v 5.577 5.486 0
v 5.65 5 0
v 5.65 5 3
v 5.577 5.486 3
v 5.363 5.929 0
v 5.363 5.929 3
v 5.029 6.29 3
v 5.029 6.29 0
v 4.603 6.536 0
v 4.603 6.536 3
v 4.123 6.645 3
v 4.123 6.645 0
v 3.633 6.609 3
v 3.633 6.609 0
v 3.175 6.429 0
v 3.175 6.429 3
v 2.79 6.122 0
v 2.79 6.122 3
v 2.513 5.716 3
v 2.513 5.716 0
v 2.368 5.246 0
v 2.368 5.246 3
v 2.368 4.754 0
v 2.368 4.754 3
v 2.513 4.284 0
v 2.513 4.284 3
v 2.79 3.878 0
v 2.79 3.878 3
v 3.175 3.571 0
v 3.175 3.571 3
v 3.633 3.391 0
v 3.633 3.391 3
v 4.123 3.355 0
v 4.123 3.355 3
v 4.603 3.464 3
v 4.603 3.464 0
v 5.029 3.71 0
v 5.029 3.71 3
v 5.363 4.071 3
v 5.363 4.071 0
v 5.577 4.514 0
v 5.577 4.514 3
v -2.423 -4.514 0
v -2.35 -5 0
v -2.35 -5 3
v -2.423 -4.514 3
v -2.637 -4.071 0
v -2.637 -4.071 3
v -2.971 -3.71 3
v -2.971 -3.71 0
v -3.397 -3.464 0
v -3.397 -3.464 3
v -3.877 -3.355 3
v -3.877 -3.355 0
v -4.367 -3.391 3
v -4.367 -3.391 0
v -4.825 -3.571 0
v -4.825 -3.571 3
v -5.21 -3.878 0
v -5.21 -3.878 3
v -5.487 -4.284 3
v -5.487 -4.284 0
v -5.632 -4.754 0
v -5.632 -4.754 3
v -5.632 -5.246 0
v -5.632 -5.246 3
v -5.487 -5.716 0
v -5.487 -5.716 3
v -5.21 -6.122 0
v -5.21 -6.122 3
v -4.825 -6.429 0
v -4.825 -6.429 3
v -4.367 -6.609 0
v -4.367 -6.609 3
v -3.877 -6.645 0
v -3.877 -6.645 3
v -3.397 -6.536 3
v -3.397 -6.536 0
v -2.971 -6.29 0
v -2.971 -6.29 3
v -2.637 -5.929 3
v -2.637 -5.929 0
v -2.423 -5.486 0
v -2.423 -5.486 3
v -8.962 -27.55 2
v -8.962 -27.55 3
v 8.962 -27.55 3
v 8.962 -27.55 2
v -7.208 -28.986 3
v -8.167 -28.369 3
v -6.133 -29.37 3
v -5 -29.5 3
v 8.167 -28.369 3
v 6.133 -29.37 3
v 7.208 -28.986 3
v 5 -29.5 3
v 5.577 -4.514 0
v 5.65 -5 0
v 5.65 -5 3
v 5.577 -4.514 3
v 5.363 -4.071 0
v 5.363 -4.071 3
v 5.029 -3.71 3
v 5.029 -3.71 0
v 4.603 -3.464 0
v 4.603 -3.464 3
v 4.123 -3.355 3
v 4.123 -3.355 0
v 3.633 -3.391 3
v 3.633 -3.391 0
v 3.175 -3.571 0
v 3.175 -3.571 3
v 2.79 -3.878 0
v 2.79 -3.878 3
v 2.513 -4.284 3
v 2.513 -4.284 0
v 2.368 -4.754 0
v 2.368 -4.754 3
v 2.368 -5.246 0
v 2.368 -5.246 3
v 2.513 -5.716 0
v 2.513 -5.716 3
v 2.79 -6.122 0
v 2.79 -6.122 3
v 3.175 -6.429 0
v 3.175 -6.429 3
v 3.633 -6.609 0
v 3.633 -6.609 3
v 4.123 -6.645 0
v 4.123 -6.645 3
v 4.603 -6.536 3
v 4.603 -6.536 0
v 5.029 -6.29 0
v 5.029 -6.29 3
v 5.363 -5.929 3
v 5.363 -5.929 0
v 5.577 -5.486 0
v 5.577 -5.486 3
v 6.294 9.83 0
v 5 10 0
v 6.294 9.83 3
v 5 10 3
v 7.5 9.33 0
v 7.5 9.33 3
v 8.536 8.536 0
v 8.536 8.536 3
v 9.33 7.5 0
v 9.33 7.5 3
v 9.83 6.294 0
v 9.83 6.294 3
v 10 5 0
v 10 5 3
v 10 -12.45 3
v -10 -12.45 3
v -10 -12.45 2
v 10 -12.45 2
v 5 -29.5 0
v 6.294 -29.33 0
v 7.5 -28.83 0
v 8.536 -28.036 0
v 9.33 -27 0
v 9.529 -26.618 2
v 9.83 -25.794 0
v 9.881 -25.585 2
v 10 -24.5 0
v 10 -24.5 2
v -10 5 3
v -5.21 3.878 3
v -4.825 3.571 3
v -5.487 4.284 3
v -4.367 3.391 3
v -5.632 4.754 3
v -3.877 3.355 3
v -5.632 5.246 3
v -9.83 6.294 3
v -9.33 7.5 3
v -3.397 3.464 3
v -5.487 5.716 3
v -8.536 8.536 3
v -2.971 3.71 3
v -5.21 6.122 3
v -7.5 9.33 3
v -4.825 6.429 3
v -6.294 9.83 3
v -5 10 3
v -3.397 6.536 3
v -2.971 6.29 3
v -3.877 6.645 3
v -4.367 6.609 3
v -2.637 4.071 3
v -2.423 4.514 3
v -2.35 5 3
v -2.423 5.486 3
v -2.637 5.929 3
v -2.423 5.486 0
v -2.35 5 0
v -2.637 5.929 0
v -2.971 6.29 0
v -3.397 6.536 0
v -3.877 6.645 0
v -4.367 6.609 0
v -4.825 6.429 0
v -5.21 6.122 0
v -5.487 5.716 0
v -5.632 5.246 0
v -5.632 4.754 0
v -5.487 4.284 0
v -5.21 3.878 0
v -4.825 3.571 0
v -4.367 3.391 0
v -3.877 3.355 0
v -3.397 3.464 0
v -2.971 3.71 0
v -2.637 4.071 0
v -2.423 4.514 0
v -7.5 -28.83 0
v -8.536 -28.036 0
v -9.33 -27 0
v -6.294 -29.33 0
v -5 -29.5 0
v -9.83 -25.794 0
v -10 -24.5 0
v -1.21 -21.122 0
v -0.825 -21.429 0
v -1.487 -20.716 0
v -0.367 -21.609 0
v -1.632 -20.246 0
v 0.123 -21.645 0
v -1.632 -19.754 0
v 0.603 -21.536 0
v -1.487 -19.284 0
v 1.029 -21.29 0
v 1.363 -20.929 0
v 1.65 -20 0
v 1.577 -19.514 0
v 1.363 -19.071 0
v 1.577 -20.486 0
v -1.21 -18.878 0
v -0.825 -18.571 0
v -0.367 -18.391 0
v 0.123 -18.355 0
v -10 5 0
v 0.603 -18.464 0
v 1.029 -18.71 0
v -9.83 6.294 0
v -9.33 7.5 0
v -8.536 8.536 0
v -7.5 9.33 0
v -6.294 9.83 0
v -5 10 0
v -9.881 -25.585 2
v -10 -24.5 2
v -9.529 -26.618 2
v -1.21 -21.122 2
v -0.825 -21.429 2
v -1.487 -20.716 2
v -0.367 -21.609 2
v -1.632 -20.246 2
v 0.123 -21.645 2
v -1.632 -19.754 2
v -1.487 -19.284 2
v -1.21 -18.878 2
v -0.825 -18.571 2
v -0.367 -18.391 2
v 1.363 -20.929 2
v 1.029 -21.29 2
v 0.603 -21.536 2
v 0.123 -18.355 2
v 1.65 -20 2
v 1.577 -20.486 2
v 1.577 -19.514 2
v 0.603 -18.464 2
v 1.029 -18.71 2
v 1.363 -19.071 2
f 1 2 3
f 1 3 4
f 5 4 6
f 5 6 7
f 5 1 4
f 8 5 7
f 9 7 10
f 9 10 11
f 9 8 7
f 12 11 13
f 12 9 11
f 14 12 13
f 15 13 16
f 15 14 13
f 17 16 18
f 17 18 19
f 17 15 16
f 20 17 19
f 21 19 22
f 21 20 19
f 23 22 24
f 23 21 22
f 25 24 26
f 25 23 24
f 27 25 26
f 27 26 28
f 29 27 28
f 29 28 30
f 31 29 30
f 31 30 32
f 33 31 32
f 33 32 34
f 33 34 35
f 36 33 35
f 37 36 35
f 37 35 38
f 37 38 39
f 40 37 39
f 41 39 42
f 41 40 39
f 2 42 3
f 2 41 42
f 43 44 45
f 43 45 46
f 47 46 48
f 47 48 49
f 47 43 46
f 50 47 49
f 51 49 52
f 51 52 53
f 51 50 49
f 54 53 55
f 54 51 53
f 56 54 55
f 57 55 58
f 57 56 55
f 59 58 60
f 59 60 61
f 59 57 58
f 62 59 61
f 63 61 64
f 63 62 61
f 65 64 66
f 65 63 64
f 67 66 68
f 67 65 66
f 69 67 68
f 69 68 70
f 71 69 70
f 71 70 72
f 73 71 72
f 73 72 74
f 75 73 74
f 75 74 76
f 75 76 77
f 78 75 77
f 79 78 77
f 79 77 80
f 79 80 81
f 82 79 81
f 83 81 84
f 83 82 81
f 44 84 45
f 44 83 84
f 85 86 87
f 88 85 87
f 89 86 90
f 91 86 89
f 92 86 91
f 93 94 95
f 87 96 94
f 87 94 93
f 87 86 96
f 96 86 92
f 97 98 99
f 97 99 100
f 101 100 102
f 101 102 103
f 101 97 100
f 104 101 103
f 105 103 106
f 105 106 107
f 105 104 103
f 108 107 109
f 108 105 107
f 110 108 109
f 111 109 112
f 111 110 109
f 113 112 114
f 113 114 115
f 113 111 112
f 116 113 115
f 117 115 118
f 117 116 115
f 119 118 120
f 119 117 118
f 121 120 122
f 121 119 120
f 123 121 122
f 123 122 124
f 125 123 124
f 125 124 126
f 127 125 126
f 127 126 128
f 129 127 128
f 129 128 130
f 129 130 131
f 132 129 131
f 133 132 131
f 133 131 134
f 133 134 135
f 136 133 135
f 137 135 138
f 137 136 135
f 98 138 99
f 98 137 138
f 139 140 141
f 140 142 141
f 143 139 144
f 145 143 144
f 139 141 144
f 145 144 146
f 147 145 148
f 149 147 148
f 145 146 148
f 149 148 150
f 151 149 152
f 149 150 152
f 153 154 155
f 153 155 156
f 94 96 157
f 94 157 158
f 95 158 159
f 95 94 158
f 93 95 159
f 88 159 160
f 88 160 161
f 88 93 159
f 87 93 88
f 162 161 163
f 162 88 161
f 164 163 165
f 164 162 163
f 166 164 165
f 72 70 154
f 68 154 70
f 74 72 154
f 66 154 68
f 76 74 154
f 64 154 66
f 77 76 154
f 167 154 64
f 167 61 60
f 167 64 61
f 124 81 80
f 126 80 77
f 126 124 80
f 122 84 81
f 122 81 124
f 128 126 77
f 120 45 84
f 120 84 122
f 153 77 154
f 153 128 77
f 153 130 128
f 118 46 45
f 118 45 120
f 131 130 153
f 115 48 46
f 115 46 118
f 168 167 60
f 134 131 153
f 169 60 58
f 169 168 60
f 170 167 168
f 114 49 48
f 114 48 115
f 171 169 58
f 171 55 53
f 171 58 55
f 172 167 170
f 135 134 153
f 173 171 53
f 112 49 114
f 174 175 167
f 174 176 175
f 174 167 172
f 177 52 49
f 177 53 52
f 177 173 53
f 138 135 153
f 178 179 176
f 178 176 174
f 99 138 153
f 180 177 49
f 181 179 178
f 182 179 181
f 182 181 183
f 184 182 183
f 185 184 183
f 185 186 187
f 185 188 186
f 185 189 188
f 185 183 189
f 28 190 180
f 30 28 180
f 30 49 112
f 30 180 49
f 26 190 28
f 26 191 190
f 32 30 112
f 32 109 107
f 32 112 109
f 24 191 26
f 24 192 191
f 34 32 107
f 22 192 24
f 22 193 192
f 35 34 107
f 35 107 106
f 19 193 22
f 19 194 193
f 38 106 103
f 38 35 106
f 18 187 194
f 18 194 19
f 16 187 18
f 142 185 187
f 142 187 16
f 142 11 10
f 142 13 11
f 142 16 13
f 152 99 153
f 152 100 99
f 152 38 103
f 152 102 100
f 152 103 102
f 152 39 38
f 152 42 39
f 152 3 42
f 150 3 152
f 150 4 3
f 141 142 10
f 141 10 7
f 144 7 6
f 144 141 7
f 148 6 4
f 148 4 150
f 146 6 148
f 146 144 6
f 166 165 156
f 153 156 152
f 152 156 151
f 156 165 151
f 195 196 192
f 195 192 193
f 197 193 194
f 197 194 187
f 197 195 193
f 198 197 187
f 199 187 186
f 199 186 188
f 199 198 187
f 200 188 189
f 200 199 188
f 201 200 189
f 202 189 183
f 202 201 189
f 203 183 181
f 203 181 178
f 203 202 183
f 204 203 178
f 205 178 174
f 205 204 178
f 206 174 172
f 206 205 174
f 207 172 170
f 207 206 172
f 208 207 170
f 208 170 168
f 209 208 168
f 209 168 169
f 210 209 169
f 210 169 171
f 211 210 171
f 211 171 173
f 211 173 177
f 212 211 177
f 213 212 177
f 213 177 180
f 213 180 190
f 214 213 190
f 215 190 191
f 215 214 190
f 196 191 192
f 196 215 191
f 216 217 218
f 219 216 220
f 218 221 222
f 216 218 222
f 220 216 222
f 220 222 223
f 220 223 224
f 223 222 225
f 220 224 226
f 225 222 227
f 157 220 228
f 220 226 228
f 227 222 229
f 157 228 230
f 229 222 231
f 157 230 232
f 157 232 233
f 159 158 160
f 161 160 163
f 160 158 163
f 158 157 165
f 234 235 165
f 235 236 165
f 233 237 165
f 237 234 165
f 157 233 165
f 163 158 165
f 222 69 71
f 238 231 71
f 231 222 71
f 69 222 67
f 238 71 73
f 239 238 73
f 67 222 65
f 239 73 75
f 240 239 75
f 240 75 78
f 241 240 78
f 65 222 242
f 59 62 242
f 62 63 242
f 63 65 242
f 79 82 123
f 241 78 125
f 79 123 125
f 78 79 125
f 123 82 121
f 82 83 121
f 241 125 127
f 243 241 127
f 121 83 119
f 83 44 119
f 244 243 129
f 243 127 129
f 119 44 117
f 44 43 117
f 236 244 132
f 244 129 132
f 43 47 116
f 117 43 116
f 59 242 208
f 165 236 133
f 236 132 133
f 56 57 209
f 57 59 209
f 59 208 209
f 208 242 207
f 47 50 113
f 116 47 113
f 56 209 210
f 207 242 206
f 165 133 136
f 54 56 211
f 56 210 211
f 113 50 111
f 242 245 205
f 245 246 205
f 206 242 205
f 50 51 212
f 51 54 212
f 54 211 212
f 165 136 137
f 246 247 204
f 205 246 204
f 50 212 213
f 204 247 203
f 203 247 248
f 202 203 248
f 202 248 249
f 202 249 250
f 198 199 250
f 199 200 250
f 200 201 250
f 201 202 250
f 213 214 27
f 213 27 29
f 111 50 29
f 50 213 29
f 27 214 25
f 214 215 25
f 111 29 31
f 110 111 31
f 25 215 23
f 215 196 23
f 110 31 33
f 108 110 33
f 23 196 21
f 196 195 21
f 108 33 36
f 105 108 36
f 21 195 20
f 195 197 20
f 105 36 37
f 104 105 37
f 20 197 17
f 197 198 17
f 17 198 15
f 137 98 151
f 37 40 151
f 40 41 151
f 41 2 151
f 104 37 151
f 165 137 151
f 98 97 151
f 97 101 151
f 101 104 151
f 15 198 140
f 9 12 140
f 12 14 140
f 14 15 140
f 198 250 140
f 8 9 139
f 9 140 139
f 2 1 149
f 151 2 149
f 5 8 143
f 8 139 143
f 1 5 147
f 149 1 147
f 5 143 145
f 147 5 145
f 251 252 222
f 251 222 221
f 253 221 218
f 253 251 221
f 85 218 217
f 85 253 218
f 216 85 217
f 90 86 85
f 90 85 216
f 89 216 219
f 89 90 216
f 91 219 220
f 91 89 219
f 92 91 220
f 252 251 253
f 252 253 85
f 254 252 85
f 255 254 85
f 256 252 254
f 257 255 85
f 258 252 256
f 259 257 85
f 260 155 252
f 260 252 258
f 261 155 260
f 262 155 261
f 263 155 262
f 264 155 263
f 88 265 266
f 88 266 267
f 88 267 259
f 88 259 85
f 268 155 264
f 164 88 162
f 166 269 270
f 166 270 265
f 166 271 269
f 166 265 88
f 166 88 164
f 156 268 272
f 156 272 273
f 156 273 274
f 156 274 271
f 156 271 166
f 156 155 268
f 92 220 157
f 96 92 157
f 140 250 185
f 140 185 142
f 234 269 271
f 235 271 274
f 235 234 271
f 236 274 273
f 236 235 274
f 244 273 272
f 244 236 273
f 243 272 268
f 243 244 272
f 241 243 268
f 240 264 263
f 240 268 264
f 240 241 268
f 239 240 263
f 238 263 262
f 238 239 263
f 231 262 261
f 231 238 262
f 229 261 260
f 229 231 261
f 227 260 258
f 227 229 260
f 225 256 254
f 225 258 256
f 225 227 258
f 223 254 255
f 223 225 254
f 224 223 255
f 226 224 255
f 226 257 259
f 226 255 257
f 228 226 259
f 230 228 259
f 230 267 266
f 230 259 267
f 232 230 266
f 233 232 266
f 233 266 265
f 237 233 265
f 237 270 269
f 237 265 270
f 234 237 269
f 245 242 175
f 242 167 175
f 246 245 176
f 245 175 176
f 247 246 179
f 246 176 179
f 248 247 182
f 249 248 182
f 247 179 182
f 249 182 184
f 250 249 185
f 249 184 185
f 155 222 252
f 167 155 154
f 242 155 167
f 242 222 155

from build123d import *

# Parameters (mm, degrees)
SKETCH_2_W          = 20
SKETCH_2_H          = 39.5
SKETCH_2_R          = 1.65
EXTRUDE_1_DEPTH     = 3
SKETCH_3_W          = 20
SKETCH_3_H          = 15.1
CUT_EXTRUDE_1_DEPTH = 1
FILLET_2_R          = 5


with BuildPart() as part:
    # ｽｹｯﾁ2 → ﾎﾞｽ - 押し出し1 (new body)
    with BuildSketch(Plane.XY):
        with Locations((0, -9.75)):
            Rectangle(SKETCH_2_W, SKETCH_2_H)
        with Locations((-4, 5)):
            Circle(SKETCH_2_R, mode=Mode.SUBTRACT)
        with Locations((-4, -5)):
            Circle(SKETCH_2_R, mode=Mode.SUBTRACT)
        with Locations((4, -5)):
            Circle(SKETCH_2_R, mode=Mode.SUBTRACT)
        with Locations((4, 5)):
            Circle(SKETCH_2_R, mode=Mode.SUBTRACT)
        with Locations((0, -20)):
            Circle(SKETCH_2_R, mode=Mode.SUBTRACT)
    extrude(amount=EXTRUDE_1_DEPTH)

    # ｽｹｯﾁ3 → ｶｯﾄ - 押し出し1 (cut)
    with BuildSketch(Plane.XY.offset(3)):
        with Locations((0, -20)):
            Rectangle(SKETCH_3_W, SKETCH_3_H)
    extrude(amount=-CUT_EXTRUDE_1_DEPTH, mode=Mode.SUBTRACT)

    # ﾌｨﾚｯﾄ2
    fillet_2_edges = [part.edges().sort_by_distance(p)[0] for p in [
        (-10, -29.5, 1.5),
        (10, -29.5, 1.5),
        (-10, 10, 1.5),
        (10, 10, 1.5),
    ]]
    fillet(fillet_2_edges, radius=FILLET_2_R)


solid = part.part
